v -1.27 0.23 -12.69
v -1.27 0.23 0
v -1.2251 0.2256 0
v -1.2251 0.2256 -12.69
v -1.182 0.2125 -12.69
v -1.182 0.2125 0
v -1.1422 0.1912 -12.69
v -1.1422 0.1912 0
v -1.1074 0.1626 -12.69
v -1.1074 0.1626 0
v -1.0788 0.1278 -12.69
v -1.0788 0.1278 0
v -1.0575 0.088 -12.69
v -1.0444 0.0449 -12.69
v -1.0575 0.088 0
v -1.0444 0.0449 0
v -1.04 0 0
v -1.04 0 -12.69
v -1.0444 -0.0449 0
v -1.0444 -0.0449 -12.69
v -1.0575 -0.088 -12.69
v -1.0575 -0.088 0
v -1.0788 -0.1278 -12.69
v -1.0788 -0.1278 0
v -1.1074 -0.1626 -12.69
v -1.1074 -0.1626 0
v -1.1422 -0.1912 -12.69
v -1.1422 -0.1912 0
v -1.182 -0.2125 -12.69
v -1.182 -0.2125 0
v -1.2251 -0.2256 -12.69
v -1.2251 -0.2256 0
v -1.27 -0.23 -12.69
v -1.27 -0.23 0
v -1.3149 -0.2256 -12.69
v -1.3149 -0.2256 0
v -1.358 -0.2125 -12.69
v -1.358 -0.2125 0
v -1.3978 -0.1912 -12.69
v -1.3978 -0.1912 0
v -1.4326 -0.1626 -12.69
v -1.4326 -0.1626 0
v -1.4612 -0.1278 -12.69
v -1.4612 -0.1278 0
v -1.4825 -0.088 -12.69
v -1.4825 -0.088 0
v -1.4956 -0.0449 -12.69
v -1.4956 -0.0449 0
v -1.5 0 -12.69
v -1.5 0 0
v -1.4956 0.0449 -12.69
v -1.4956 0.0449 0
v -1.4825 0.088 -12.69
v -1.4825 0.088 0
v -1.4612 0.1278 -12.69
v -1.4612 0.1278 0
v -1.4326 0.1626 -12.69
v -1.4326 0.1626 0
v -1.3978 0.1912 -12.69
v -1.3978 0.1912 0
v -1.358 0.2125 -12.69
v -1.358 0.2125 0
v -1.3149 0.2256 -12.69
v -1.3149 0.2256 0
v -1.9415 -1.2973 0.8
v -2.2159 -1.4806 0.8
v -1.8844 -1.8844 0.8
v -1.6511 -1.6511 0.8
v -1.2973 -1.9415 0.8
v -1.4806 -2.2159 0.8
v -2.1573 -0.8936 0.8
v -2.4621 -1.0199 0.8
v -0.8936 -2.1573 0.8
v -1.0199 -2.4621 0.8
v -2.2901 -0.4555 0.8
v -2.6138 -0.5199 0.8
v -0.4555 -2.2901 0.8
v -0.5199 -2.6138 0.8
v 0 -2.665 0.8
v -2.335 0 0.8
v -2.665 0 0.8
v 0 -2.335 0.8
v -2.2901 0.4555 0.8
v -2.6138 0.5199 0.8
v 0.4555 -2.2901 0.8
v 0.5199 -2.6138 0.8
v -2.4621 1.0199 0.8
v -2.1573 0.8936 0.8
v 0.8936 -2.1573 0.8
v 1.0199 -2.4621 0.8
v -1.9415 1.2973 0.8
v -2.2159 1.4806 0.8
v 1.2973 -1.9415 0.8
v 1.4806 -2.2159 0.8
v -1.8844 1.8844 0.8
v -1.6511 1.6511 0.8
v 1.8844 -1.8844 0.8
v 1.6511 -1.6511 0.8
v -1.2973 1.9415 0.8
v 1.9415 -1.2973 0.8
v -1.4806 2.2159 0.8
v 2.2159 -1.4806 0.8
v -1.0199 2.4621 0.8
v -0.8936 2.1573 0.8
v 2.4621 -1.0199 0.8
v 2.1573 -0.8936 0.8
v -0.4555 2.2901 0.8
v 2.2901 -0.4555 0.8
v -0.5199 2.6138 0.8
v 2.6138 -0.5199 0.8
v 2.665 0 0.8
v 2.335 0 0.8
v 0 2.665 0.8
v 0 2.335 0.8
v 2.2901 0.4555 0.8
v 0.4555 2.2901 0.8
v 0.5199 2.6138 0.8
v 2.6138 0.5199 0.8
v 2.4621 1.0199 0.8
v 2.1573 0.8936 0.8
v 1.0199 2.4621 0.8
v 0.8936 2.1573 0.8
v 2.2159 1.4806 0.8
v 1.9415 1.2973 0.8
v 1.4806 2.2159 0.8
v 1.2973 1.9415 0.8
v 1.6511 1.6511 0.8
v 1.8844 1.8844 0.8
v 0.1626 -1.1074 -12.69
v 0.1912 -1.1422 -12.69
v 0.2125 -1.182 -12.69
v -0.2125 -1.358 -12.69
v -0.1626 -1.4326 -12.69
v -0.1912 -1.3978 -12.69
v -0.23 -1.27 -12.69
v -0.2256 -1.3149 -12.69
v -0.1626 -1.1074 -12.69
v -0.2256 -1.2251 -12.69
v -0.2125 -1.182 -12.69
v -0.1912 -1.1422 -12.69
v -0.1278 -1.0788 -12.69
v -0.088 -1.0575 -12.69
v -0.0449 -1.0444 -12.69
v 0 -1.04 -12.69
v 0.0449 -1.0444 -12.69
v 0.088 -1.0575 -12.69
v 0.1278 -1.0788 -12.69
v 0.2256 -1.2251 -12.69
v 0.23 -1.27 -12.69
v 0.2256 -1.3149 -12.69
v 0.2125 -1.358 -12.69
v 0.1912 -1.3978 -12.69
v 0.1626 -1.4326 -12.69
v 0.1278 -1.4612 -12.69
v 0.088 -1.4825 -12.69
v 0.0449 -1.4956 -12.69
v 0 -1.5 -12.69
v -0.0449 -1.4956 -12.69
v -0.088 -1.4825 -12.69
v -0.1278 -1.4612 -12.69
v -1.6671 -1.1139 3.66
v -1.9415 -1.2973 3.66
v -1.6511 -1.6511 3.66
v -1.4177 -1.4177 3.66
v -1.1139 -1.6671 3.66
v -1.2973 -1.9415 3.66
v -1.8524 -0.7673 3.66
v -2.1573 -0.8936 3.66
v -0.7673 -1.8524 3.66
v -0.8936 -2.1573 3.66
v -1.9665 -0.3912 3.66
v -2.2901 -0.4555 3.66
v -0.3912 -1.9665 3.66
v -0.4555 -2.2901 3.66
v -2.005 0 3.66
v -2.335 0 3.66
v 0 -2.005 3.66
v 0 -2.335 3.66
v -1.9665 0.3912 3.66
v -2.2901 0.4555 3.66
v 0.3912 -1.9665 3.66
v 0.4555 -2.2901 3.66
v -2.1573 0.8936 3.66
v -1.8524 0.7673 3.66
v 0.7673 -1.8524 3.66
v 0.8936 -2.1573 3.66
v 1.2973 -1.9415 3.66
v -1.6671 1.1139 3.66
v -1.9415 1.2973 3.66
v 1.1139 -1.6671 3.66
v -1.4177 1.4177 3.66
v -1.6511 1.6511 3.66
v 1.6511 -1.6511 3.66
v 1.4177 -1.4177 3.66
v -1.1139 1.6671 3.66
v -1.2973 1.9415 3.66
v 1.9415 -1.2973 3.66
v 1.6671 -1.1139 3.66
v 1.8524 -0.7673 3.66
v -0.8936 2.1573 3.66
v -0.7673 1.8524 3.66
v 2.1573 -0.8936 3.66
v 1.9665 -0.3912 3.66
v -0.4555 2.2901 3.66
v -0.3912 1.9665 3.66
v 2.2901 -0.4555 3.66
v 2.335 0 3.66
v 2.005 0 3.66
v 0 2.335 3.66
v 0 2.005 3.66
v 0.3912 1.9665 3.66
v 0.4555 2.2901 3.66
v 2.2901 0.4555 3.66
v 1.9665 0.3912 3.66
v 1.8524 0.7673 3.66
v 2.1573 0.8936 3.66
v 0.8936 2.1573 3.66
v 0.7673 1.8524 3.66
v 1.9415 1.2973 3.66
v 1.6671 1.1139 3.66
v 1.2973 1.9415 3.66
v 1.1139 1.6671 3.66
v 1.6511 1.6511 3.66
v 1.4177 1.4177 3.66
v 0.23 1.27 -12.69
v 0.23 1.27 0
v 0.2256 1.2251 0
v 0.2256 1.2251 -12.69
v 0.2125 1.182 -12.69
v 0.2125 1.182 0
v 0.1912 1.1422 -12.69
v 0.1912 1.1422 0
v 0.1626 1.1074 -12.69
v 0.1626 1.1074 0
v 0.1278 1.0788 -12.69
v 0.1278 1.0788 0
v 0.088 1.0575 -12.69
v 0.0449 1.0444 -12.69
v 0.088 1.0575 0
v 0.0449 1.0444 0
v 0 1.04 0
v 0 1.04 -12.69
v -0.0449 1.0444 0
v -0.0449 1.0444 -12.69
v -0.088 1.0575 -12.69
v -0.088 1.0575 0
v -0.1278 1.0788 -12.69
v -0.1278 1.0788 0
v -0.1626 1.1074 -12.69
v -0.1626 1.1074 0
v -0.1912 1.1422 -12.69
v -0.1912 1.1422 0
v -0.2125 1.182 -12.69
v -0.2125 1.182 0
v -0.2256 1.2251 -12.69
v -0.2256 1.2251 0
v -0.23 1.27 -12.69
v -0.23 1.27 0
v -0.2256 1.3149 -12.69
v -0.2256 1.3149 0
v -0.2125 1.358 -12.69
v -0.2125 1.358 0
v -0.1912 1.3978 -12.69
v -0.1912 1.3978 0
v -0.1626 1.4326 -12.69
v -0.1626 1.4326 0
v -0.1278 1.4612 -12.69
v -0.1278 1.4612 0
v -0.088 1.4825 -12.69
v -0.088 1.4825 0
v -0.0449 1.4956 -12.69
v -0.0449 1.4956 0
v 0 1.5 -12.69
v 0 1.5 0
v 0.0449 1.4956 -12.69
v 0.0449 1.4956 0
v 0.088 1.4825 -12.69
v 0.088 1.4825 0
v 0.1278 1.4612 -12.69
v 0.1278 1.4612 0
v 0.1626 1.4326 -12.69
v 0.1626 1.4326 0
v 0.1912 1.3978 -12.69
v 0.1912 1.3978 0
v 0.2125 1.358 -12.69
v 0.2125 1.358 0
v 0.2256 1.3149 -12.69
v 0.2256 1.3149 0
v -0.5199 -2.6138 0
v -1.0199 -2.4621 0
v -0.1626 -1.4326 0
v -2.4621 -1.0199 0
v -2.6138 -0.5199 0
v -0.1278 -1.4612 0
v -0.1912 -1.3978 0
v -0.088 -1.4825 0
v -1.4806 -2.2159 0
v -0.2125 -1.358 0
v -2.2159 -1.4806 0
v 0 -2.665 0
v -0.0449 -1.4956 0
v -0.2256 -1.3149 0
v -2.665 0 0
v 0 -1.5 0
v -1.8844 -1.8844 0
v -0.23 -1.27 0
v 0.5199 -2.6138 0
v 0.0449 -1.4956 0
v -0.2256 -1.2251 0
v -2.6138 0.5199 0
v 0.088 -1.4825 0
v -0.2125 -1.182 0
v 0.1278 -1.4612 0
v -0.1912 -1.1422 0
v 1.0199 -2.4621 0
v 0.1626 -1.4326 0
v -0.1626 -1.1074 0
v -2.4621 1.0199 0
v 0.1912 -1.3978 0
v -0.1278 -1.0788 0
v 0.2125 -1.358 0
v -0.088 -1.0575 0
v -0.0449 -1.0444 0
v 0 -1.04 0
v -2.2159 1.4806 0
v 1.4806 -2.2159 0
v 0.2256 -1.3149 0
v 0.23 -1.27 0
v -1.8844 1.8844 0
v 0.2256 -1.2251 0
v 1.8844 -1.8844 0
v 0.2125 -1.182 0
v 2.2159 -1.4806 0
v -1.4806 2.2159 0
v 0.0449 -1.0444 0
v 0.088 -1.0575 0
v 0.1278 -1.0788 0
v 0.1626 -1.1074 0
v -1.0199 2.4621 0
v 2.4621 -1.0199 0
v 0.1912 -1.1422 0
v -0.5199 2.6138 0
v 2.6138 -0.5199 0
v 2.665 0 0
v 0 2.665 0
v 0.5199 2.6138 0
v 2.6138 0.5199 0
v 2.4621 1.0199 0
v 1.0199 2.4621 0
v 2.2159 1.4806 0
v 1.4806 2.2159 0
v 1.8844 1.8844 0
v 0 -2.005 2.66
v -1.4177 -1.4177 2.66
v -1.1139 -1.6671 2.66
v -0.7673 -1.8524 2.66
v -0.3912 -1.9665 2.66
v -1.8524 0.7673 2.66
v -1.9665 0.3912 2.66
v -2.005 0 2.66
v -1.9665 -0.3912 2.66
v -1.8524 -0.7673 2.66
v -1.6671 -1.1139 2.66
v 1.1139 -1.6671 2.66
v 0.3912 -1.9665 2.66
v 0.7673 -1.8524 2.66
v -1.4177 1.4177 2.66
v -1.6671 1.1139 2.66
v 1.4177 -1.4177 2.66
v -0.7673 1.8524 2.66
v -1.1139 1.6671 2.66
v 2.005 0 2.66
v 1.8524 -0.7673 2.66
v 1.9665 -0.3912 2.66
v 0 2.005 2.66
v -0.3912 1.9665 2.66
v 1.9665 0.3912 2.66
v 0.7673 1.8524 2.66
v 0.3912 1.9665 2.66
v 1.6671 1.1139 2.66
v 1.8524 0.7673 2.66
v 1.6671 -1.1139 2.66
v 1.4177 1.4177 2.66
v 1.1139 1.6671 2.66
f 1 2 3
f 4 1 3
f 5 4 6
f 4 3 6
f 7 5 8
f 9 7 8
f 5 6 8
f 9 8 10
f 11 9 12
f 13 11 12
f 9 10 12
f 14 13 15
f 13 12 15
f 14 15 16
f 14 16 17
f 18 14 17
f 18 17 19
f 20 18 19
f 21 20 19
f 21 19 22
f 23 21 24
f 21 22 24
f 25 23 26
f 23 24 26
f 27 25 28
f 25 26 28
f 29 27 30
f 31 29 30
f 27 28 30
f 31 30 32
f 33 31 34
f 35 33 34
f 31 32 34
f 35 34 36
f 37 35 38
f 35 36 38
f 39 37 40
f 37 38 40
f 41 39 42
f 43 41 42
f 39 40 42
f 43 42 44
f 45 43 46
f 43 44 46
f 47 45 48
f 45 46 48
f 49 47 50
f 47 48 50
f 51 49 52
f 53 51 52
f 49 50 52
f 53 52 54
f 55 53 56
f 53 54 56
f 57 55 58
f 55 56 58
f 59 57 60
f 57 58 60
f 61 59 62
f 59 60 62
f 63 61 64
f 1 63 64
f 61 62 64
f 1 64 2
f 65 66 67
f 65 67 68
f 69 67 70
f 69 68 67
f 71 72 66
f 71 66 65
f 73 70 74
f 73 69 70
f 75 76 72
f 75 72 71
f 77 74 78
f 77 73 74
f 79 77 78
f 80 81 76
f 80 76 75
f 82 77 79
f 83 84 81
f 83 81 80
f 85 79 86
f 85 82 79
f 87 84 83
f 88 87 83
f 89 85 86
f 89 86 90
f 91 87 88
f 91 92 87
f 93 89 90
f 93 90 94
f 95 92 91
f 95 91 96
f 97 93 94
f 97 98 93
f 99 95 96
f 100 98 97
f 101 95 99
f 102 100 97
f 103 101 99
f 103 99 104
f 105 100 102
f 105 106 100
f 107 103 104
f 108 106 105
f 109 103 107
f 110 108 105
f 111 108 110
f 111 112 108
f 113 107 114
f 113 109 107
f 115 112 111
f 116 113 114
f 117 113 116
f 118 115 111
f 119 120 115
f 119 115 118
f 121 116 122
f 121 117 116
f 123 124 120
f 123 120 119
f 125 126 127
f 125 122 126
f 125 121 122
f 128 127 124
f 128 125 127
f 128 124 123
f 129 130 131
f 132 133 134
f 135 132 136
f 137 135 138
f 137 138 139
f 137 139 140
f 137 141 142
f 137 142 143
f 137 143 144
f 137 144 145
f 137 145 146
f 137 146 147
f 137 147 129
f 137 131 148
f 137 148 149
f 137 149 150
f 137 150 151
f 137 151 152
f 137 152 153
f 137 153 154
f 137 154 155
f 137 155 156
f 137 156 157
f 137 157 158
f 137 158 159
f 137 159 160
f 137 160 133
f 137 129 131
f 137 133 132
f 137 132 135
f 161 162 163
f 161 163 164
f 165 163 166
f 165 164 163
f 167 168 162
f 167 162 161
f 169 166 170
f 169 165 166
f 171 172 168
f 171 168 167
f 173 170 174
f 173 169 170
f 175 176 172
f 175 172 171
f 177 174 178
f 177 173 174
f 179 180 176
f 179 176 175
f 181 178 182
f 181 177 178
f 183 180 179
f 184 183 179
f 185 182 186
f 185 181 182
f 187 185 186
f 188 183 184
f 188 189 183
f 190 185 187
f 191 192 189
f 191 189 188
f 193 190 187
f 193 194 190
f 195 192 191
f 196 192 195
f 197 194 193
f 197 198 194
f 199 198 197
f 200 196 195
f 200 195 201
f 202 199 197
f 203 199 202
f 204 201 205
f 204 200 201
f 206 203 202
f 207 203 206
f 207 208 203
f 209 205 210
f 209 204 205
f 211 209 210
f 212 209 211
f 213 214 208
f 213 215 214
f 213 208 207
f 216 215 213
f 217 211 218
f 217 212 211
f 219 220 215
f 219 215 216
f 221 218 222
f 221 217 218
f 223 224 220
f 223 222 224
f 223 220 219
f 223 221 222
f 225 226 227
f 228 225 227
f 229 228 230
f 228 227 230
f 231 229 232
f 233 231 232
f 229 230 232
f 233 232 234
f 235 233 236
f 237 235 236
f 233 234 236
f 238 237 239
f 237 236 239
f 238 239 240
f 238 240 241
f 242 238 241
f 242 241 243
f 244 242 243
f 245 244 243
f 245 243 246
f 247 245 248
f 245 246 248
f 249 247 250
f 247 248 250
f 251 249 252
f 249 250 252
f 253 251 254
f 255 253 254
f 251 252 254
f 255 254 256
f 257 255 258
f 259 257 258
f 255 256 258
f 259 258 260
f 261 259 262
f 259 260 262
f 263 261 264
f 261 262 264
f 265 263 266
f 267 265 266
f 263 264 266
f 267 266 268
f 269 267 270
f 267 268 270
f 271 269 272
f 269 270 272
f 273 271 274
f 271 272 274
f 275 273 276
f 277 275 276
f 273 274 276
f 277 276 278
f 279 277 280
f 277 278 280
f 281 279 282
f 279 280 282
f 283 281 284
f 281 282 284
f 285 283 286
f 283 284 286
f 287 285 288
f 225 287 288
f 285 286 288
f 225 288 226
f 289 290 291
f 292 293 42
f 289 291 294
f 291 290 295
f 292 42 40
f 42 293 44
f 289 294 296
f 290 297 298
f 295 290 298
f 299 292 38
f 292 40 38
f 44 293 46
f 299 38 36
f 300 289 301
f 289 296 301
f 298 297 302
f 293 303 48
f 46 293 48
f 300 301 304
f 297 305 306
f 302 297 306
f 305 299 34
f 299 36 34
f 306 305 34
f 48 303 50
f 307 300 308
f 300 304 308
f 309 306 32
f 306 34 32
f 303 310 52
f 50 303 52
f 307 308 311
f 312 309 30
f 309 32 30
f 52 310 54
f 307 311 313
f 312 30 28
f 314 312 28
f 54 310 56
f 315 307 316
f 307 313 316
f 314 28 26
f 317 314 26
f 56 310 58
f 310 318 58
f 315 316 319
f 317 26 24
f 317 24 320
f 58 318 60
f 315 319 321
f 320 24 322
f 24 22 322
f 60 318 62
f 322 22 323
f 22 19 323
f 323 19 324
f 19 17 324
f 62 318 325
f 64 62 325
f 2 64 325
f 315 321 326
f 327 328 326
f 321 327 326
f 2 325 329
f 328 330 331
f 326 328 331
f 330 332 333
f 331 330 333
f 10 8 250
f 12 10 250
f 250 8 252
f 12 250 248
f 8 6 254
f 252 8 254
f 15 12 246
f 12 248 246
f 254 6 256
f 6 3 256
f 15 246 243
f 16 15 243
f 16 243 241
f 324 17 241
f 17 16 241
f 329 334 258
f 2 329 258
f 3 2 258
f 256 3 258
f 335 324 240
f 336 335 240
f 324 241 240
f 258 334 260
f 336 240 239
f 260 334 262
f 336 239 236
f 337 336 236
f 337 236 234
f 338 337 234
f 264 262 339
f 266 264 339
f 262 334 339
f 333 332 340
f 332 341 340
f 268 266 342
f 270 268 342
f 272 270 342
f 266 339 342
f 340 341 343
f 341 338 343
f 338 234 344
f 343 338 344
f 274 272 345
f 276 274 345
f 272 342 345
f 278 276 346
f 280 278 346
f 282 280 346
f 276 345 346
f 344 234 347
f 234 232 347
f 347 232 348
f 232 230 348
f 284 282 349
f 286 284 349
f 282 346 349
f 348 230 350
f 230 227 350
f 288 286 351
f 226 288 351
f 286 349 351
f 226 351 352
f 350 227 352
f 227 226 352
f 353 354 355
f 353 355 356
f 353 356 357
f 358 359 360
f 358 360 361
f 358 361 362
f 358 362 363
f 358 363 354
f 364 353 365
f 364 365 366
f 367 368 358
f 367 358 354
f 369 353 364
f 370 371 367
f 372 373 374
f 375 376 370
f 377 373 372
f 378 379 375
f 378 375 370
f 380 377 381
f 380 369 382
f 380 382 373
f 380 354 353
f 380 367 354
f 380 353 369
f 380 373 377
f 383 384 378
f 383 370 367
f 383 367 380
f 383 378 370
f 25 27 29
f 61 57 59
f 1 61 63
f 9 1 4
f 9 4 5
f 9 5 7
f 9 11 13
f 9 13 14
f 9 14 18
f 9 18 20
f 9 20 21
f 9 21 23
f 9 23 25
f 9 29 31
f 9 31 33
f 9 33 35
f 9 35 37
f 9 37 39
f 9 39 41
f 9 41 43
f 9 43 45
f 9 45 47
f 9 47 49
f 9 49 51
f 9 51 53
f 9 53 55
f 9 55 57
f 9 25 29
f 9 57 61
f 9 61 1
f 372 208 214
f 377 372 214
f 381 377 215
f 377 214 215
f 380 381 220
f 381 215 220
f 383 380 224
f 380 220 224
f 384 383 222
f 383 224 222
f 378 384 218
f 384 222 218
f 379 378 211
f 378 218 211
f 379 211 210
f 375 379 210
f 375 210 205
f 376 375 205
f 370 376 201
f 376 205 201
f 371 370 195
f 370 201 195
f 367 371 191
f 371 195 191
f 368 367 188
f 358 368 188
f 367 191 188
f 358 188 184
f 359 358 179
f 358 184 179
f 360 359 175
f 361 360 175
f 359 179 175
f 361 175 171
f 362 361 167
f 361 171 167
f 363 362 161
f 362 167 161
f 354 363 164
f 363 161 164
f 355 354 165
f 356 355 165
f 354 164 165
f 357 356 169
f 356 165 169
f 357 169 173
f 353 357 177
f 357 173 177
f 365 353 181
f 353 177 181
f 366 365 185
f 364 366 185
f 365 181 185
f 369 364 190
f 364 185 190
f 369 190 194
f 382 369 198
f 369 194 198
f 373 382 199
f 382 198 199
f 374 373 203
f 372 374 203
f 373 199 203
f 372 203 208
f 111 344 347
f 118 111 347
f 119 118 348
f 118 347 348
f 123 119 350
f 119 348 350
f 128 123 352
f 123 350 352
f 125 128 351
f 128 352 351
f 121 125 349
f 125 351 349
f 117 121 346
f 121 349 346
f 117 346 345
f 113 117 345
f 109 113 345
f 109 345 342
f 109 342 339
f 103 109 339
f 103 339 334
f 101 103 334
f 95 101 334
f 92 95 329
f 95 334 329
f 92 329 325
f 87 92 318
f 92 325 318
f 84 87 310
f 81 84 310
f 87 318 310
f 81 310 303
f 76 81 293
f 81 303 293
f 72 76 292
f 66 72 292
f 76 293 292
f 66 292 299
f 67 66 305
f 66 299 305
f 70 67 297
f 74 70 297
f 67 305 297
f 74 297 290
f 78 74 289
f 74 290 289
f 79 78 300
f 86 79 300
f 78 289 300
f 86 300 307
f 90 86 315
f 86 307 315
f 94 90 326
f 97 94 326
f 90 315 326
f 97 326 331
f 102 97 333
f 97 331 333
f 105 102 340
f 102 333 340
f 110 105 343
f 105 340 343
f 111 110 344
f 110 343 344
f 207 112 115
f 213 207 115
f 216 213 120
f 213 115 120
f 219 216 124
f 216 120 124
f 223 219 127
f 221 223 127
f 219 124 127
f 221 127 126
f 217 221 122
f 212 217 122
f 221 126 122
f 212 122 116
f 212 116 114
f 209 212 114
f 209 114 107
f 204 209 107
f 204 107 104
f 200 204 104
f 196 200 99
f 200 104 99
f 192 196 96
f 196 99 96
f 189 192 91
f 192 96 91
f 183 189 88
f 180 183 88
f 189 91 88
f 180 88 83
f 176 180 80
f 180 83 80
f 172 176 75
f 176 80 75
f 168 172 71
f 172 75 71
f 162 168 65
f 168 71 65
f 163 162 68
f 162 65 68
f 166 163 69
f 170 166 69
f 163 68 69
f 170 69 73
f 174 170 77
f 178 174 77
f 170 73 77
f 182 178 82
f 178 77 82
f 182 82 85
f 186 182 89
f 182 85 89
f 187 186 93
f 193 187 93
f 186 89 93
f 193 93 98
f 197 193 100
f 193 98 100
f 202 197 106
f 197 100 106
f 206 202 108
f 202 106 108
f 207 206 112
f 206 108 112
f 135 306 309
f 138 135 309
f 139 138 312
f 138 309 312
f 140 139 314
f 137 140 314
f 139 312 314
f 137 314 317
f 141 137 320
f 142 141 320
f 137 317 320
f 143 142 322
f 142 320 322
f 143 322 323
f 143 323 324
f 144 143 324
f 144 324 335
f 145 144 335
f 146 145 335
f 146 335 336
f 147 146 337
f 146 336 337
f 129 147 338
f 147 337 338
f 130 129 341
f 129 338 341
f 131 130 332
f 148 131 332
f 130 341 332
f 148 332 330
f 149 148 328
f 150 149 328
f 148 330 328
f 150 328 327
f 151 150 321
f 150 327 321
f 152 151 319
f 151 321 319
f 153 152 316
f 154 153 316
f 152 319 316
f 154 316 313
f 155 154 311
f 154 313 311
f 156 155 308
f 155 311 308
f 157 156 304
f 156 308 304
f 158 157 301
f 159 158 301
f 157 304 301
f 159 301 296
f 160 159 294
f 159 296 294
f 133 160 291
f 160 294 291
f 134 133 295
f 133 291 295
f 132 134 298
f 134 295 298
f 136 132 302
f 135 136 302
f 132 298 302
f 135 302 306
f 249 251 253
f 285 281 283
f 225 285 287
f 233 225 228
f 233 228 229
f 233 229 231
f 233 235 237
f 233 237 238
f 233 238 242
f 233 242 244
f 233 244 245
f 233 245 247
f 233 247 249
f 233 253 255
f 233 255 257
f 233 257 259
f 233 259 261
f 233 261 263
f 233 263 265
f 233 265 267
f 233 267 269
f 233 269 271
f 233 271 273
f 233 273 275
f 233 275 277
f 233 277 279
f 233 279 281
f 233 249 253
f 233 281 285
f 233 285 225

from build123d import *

# Parameters (mm, degrees)
SKETCH1_R           = 2.665
BOSS_EXTRUDE1_DEPTH = 0.8
SKETCH2_R           = 2.335
BOSS_EXTRUDE2_DEPTH = 2.86
SKETCH3_R           = 0.23
BOSS_EXTRUDE3_DEPTH = 12.69
CIRPATTERN1_COUNT   = 3
CIRPATTERN1_ANGLE   = 180
SKETCH4_R           = 2.005
CUT_EXTRUDE1_DEPTH  = 1


with BuildPart() as part:
    # Sketch1 → Boss-Extrude1 (new body)
    with BuildSketch(Plane.XY):
        Circle(SKETCH1_R)
    extrude(amount=BOSS_EXTRUDE1_DEPTH)

    # Sketch2 → Boss-Extrude2 (add)
    with BuildSketch(Plane.XY.offset(0.8)):
        Circle(SKETCH2_R)
    extrude(amount=BOSS_EXTRUDE2_DEPTH)

    # Sketch3 → Boss-Extrude3 (add)
    with BuildSketch(Plane(origin=(0, 0, 0), x_dir=(-1, 0, 0), z_dir=(0, 0, -1))):
        with Locations(Location((0, 1.27, 0), (0, 0, 180))):
            Circle(SKETCH3_R)
    boss_extrude3 = extrude(amount=BOSS_EXTRUDE3_DEPTH)

    # CirPattern1: Boss-Extrude3 ×3 about axis
    cirpattern1_axis = Axis((0, 0, 0), (0, 0, 1))
    for i in range(1, CIRPATTERN1_COUNT):
        add(boss_extrude3.rotate(cirpattern1_axis, i * CIRPATTERN1_ANGLE / (CIRPATTERN1_COUNT - 1)))

    # Sketch4 → Cut-Extrude1 (cut)
    with BuildSketch(Plane.XY.offset(3.66)):
        Circle(SKETCH4_R)
    extrude(amount=-CUT_EXTRUDE1_DEPTH, mode=Mode.SUBTRACT)


solid = part.part
